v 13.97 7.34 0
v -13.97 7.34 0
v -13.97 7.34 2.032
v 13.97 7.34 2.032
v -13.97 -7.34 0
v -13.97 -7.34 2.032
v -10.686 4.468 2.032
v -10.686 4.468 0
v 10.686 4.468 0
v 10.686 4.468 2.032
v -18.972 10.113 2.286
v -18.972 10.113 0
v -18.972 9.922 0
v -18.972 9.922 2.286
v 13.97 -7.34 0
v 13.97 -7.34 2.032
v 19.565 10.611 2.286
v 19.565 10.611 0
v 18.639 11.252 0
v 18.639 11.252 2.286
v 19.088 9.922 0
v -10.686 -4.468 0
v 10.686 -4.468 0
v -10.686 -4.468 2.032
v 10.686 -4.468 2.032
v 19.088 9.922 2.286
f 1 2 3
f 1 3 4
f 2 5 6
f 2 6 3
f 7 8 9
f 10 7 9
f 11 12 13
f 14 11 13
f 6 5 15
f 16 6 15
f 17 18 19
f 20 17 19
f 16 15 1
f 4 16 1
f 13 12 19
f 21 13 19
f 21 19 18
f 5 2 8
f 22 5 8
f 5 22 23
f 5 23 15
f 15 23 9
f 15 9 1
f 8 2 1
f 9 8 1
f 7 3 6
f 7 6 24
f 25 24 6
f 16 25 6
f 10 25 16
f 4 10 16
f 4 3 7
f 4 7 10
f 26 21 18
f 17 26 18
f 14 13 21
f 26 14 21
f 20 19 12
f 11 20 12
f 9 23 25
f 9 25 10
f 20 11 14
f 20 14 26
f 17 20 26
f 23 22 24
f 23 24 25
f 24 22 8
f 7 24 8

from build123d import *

# Parameters (mm, degrees)
F0_W     = 27.94
F0_H     = 14.680338
F0_W_2   = 21.372792
F0_H_2   = 8.93609
F1_DEPTH = 2.032
F3_DEPTH = 2.286


with BuildPart() as f1:
    # F0 (on Top) → F1 (new body)
    with BuildSketch(Plane.XY):
        Rectangle(F0_W, F0_H)
        Rectangle(F0_W_2, F0_H_2, mode=Mode.SUBTRACT)
    extrude(amount=F1_DEPTH)


with BuildPart() as f3:
    # F2 (on Top) → F3 (new body)
    with BuildSketch(Plane.XY):
        Polygon((18.638844, 11.252255), (-18.972345, 10.112522), (-18.972345, 9.922187), (19.087898, 9.922187), (19.564876, 10.611155), align=None)
    extrude(amount=F3_DEPTH)


solid = Compound([f1.part, f3.part])
